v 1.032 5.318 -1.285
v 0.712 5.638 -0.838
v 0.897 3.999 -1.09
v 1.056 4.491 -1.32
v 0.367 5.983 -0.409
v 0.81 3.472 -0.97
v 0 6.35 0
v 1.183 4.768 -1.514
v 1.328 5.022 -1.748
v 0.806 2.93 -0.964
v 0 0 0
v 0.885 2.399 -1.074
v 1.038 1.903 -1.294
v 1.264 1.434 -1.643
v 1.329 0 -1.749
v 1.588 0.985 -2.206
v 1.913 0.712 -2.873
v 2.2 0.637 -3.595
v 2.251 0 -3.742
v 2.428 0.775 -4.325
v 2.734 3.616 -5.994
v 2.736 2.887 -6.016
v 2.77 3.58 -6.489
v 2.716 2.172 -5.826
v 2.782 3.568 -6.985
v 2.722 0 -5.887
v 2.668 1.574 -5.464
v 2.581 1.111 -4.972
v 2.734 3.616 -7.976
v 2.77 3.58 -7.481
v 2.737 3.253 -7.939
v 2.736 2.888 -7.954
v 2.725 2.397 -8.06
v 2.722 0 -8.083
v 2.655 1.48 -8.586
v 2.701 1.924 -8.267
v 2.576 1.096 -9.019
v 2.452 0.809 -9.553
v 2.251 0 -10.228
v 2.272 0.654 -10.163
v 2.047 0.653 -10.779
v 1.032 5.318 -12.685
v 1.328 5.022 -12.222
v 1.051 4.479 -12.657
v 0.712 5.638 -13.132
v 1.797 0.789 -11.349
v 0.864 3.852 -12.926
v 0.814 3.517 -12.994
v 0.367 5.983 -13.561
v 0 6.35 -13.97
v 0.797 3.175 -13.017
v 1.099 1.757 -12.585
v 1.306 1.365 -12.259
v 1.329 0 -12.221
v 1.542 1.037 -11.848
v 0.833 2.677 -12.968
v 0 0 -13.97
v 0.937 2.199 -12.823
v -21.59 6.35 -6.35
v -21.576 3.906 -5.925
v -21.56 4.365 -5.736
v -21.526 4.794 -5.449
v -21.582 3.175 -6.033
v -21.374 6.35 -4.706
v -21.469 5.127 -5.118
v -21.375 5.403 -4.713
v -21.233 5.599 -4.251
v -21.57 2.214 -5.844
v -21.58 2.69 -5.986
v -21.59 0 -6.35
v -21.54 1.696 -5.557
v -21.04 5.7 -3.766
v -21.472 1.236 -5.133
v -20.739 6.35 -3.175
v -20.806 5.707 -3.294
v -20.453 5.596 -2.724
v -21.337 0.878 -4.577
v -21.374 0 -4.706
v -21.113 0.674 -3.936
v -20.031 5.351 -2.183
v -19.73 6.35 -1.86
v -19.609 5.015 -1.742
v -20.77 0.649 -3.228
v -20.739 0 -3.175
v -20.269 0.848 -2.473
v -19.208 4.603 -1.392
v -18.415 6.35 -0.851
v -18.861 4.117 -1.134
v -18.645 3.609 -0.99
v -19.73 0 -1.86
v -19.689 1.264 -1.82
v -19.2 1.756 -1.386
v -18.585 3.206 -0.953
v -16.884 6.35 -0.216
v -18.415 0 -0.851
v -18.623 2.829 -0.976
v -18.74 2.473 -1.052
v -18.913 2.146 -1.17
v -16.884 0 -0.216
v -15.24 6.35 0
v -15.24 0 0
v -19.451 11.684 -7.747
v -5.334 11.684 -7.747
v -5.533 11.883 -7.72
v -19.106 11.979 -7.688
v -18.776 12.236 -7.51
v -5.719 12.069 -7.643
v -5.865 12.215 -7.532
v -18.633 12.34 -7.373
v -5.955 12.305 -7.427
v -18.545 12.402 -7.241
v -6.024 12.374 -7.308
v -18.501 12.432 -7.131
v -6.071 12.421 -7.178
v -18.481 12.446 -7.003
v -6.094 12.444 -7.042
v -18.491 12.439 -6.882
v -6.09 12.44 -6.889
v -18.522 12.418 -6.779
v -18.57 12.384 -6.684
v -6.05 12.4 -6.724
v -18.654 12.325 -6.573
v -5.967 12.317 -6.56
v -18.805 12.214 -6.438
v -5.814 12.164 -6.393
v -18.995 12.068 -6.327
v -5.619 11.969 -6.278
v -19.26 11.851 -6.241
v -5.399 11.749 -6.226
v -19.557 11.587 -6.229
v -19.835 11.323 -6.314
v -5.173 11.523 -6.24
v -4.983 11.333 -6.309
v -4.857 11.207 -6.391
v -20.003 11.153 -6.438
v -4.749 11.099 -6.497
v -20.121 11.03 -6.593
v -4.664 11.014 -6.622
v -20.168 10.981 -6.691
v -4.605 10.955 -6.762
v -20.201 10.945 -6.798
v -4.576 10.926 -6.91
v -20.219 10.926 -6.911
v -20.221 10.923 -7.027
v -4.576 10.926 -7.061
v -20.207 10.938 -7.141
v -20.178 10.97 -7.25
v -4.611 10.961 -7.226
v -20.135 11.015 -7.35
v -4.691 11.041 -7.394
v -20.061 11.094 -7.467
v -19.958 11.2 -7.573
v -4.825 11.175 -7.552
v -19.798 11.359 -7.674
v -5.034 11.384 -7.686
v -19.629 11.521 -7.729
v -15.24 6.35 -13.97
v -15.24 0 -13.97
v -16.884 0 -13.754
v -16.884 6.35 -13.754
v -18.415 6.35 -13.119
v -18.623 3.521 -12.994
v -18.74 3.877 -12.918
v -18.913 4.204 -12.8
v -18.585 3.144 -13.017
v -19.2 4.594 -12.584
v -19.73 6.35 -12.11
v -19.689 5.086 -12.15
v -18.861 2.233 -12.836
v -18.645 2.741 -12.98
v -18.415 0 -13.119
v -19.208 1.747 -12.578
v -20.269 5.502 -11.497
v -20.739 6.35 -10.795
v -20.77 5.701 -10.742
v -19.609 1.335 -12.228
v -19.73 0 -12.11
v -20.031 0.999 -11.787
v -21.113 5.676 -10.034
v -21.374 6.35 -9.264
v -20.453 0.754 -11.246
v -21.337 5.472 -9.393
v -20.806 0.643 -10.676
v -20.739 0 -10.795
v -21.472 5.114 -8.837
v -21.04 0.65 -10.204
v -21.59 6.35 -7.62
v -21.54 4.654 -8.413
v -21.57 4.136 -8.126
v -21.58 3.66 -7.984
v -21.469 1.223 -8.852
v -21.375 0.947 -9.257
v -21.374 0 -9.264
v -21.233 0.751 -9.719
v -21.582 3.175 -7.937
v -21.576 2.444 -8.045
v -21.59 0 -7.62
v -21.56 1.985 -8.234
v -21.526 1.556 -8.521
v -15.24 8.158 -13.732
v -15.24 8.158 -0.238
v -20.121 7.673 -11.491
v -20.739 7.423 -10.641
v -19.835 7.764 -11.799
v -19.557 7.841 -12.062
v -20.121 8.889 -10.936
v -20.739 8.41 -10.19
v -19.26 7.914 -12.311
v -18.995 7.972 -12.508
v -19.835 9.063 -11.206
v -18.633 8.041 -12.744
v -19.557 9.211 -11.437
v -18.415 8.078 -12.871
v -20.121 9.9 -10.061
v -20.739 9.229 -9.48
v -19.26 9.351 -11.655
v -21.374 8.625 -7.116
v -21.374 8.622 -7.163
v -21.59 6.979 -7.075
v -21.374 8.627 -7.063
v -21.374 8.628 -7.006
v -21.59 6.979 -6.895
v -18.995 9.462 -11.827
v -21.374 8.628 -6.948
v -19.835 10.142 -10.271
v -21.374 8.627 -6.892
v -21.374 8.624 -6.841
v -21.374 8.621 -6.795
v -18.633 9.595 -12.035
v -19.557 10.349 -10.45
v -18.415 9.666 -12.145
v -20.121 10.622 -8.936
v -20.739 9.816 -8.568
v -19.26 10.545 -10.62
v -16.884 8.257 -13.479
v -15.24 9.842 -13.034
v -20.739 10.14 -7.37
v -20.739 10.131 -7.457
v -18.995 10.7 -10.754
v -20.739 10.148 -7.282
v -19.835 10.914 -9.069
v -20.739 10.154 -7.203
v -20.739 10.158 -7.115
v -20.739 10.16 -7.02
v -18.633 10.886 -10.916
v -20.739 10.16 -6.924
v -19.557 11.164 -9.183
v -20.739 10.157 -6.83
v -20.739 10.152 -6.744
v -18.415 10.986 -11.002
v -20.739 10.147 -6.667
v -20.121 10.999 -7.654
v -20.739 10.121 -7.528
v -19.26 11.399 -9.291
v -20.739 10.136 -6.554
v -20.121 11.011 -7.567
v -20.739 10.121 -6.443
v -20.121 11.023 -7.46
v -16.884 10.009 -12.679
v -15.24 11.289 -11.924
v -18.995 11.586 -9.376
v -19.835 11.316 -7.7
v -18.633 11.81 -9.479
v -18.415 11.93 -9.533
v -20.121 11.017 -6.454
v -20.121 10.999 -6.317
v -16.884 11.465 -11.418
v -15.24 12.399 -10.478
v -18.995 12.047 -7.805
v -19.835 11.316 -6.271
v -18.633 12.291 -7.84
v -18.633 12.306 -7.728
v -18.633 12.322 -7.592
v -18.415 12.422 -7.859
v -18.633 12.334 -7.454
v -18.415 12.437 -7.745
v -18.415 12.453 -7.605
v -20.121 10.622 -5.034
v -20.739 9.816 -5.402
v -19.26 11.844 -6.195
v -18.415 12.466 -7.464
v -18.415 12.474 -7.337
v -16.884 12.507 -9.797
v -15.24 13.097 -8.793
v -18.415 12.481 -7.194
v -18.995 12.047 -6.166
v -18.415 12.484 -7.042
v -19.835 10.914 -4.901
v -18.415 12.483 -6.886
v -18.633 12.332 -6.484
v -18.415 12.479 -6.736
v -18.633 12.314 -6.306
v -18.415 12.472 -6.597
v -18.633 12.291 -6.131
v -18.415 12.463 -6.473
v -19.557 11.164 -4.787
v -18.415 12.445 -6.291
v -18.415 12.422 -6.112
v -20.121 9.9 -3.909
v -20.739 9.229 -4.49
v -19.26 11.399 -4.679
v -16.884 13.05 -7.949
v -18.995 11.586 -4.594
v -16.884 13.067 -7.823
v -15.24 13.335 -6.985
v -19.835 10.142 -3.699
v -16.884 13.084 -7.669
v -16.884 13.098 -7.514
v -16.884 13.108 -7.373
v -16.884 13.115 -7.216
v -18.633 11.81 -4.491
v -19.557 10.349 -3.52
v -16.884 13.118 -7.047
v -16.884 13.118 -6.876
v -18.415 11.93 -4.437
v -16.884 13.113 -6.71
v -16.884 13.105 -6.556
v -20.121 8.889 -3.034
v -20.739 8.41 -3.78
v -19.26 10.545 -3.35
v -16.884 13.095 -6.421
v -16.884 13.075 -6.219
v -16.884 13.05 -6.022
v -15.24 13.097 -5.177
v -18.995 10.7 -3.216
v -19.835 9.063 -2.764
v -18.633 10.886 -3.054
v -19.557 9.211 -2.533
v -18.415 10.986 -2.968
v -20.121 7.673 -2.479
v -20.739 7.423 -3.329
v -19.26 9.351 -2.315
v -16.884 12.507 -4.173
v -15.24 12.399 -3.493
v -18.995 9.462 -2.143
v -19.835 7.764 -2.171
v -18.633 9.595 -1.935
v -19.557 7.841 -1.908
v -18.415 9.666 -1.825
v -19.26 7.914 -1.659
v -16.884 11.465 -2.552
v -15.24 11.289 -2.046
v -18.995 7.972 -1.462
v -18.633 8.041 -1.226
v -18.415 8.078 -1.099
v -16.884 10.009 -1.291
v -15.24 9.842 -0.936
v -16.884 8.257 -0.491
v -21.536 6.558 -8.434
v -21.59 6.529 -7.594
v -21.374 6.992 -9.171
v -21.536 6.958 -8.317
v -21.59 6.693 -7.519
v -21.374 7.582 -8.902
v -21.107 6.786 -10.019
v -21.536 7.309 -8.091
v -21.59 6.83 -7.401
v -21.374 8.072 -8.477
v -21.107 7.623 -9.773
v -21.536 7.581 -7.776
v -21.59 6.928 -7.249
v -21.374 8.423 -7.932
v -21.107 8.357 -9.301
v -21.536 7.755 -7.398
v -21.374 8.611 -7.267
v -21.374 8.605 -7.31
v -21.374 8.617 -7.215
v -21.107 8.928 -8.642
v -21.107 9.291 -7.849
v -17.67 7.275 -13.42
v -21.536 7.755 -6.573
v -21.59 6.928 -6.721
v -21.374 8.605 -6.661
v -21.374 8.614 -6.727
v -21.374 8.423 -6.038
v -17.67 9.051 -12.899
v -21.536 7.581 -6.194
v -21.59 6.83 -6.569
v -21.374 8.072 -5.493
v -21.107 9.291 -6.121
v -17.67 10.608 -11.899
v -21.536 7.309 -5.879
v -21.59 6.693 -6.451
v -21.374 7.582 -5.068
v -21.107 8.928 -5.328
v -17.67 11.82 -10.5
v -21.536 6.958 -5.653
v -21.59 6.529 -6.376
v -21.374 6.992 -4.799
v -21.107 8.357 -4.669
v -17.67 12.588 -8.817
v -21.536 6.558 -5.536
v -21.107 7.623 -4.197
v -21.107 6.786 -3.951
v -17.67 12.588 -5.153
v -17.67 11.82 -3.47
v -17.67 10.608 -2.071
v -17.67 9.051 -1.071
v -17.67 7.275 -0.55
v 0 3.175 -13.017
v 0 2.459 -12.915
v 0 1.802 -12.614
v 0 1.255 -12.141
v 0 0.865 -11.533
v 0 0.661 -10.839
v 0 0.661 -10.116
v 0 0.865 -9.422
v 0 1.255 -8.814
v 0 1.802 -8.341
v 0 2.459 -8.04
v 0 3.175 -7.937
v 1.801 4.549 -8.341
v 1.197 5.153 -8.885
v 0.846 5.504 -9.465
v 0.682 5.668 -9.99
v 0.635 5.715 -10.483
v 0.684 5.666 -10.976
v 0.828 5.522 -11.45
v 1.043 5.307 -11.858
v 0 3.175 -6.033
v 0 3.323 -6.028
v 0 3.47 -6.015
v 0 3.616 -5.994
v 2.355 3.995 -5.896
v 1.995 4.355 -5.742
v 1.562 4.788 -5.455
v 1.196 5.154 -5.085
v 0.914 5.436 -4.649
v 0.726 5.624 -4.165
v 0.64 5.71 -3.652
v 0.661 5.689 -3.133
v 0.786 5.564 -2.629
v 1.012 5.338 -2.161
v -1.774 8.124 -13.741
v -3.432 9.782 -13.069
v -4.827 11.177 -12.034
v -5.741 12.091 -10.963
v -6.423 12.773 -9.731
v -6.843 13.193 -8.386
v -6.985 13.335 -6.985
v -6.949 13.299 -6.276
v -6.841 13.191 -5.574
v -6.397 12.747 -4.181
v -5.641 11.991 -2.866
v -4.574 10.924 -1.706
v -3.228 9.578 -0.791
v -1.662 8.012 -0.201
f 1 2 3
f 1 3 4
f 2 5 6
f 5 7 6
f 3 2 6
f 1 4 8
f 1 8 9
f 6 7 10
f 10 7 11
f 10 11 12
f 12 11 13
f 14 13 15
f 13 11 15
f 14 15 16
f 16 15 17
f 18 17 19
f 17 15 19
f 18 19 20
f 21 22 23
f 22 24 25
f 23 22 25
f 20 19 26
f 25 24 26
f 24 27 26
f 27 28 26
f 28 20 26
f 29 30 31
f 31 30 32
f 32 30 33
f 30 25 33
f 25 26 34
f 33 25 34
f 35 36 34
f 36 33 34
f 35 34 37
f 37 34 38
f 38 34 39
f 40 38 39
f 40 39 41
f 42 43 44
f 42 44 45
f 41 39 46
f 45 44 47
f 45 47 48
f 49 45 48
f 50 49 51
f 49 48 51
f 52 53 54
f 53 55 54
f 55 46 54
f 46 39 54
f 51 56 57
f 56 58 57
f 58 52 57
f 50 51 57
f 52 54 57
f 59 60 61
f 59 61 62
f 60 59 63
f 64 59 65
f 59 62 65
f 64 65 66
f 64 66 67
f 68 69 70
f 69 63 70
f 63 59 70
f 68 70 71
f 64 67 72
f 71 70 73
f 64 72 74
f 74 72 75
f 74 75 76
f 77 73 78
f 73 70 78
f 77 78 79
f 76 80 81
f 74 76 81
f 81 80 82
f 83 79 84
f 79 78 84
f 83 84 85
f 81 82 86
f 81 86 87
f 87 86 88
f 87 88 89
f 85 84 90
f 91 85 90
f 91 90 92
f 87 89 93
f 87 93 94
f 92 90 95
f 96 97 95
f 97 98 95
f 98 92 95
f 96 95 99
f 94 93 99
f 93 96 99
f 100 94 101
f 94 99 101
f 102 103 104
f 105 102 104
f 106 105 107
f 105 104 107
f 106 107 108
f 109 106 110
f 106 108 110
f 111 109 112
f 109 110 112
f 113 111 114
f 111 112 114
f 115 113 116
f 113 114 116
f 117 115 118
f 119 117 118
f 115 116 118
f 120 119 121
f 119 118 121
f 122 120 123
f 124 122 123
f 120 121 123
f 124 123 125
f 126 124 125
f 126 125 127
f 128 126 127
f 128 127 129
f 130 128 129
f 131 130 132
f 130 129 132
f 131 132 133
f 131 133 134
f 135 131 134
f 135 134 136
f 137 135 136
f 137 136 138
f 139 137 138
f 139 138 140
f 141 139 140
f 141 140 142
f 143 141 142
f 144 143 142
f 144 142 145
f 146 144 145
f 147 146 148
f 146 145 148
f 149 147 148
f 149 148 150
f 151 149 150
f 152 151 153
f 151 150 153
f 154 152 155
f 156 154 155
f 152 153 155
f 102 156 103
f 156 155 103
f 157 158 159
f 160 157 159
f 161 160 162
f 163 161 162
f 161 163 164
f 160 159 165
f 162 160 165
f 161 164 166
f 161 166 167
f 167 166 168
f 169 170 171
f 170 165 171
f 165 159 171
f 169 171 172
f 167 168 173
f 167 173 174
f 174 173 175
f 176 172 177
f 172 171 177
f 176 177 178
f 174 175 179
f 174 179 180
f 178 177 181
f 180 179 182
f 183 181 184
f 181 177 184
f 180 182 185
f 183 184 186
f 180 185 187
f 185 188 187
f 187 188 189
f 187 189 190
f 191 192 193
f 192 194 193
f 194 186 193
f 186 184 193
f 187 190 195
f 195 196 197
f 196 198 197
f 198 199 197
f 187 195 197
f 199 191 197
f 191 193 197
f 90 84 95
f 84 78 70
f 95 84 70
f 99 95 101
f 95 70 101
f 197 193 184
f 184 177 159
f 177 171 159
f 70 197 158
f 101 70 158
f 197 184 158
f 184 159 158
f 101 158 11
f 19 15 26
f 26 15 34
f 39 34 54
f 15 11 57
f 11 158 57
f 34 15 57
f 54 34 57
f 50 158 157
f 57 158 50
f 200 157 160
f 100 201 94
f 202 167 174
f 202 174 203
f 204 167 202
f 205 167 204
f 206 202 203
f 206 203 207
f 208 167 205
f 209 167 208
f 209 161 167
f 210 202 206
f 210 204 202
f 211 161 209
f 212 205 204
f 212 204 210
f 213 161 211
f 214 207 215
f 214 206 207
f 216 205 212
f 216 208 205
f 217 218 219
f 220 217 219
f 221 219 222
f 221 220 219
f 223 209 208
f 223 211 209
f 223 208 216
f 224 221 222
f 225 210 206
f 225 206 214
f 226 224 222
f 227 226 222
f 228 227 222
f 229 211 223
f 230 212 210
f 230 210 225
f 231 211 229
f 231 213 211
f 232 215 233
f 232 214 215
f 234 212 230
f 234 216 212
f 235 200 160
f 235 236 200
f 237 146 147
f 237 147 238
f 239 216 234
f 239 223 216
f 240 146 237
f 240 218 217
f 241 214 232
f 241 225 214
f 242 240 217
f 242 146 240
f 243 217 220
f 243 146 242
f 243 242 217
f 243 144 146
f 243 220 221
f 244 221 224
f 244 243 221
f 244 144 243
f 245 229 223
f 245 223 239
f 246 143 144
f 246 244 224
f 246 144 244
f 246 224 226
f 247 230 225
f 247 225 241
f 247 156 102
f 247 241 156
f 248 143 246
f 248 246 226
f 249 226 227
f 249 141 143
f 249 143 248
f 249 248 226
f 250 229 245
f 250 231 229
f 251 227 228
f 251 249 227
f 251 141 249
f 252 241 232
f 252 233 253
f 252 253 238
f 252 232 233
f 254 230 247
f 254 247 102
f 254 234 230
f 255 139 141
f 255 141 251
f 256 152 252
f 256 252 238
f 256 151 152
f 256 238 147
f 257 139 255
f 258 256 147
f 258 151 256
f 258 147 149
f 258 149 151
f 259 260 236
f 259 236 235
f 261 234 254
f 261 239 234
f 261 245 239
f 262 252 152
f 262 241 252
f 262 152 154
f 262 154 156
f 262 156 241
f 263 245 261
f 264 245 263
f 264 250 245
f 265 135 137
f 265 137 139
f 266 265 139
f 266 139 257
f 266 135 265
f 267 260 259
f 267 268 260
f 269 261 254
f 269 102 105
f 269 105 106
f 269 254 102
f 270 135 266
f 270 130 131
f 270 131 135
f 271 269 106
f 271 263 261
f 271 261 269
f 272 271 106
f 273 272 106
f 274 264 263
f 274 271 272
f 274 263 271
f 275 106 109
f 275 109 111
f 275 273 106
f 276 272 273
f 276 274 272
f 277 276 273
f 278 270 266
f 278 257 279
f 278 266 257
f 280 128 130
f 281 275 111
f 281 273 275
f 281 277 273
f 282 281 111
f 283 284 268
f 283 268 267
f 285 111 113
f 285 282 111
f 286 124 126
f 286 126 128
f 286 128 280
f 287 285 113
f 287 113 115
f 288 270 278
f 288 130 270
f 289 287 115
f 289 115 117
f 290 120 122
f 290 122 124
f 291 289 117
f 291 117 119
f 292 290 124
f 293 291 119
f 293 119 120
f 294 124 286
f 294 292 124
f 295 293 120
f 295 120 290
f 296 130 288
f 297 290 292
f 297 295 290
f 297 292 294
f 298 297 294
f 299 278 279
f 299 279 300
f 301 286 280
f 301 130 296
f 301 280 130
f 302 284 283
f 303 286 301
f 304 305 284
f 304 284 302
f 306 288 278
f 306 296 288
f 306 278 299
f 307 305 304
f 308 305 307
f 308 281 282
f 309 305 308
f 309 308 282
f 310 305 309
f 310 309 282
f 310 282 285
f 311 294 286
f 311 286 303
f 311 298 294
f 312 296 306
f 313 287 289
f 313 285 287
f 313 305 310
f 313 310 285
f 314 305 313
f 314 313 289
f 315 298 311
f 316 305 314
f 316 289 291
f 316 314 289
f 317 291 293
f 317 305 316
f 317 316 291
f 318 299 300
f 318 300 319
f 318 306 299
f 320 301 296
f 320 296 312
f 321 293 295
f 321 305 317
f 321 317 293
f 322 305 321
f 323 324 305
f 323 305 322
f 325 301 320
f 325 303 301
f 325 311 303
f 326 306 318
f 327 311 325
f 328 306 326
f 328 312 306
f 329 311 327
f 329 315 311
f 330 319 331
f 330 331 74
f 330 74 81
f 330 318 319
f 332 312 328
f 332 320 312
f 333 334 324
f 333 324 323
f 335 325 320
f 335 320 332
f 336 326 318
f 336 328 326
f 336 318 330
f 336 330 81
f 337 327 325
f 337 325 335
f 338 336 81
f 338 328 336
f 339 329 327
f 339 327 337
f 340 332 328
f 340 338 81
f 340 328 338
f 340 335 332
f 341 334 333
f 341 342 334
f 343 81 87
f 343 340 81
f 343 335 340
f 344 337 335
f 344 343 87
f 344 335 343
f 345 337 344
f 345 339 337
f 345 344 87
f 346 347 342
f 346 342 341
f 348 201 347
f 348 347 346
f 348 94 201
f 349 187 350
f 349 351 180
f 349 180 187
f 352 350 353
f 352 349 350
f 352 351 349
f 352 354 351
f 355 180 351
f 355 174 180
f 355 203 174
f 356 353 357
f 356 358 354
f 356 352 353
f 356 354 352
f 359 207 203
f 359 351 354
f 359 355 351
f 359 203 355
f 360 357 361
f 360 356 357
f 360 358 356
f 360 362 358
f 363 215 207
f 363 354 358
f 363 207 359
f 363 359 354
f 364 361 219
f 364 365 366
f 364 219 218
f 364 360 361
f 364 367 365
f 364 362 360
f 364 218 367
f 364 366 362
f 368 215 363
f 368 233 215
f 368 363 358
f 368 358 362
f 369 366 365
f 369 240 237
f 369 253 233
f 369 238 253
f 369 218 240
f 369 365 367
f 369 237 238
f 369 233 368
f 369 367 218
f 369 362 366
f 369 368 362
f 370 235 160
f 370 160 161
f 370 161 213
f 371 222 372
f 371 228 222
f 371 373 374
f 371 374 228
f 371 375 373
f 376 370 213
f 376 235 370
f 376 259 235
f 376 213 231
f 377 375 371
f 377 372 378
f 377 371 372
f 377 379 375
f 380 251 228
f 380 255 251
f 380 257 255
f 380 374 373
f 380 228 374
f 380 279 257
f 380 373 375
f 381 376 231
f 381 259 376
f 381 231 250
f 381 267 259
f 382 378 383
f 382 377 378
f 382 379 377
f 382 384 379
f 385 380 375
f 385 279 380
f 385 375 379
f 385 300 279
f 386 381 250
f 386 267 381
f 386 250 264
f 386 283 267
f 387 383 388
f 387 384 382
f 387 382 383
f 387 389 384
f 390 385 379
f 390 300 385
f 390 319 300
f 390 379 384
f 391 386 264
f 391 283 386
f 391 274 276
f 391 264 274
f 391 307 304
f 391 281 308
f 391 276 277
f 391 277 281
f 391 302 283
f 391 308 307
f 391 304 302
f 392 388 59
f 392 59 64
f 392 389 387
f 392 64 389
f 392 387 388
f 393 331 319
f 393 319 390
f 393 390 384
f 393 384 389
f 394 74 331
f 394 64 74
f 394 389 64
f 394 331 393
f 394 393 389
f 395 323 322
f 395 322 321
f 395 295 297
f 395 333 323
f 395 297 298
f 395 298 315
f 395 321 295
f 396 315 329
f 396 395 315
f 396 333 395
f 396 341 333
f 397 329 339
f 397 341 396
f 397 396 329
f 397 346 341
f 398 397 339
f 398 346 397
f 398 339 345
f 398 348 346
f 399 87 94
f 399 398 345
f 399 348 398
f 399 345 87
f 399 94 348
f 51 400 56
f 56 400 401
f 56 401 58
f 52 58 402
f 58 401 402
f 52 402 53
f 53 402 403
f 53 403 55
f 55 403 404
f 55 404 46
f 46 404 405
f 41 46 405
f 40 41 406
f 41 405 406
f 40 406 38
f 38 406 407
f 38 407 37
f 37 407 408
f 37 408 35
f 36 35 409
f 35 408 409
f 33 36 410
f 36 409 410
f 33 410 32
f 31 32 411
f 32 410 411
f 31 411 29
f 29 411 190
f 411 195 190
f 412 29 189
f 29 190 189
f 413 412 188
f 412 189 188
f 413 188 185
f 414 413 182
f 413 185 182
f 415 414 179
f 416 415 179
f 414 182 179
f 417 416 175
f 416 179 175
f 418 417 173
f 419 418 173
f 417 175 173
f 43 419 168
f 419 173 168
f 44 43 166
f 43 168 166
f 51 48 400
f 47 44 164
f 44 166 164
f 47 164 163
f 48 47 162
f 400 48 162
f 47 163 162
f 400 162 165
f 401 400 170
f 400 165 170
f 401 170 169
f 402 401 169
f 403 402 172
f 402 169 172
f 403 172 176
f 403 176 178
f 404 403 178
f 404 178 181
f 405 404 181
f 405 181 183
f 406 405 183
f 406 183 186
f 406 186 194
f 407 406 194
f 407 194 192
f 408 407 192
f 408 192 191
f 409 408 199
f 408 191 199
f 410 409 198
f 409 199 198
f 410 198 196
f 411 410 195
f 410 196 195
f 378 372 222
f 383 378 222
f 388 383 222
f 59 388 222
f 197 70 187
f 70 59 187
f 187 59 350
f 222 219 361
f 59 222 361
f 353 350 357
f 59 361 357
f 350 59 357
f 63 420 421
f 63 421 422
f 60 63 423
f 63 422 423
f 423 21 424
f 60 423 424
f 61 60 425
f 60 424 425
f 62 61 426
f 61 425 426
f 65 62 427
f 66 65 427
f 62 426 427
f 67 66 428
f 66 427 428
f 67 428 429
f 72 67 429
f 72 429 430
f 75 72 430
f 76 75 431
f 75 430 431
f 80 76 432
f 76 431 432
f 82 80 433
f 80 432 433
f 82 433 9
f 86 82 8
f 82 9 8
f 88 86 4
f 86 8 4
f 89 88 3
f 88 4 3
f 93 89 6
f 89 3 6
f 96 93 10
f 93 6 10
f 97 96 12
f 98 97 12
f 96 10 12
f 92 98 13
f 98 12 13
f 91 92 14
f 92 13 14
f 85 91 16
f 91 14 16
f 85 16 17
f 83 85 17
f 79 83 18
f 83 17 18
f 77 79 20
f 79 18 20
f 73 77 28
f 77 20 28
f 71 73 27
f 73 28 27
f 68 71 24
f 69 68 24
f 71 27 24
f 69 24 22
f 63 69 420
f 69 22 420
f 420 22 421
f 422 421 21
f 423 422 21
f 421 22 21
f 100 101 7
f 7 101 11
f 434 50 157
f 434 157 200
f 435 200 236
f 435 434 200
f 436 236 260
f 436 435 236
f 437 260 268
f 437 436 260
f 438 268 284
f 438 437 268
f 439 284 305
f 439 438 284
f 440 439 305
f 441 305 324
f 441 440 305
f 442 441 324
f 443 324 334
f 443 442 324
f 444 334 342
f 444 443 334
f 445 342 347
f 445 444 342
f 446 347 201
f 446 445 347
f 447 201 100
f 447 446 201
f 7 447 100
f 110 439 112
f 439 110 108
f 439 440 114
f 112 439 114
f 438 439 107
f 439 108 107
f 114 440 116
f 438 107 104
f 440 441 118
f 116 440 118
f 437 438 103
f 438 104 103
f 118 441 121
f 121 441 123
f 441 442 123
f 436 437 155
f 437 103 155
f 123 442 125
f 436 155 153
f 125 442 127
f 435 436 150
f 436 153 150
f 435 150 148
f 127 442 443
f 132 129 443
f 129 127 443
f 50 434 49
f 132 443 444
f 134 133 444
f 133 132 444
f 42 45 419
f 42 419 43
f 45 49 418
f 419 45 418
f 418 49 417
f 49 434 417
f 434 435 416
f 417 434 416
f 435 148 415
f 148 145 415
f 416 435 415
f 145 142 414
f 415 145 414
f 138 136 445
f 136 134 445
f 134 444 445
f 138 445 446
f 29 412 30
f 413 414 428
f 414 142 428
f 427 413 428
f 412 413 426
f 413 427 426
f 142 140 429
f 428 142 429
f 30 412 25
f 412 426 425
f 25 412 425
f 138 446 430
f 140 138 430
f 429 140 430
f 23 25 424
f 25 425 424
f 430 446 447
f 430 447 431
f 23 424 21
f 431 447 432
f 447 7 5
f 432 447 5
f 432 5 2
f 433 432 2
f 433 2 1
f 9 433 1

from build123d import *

# Parameters (mm, degrees)
SKETCH1_W                = 21.59
SKETCH1_H                = 13.97
DEPTH_A_DEPTH            = 6.35
ROUND_EXTRUDE_DEPTH      = 21.59
ANGLE_CUT_DEPTH          = 29.967416609
STRING_HOLE_R            = 0.762
STRING_HOLE_CUT_DEPTH    = 29.967416609
ELASTIC_HOLES_R          = 2.54
ELASTIC_HOLE_CUT_DEPTH   = 29.967416609
FILLET1_R                = 6.35
GUIDE_OUTIE_REACH        = 30.967
SKETCH7_R                = 2.54
ELASTIC_HOLE_CUT_2_DEPTH = 29.967416778


with BuildPart() as part:
    # Sketch1 → depth a (new body)
    with BuildSketch(Plane(origin=(0, 0, 0), x_dir=(1, 0, 0), z_dir=(0, 1, 0))):
        with Locations((-10.795, 6.985)):
            Rectangle(SKETCH1_W, SKETCH1_H)
    extrude(amount=DEPTH_A_DEPTH)

    # Sketch4 → round extrude (add)
    with BuildSketch(Plane(origin=(0, 0, 0), x_dir=(0, 0, -1), z_dir=(1, 0, 0))):
        with BuildLine():
            Line((0, 6.35), (13.97, 6.35))
            ThreePointArc((13.97, 6.35), (6.985, 13.335), (0, 6.35))
        make_face()
    extrude(amount=-ROUND_EXTRUDE_DEPTH)

    # Sketch5 → angle cut (cut, through all)
    with BuildSketch(Plane.XY):
        Polygon((0, 6.35), (0, 13.335), (-6.985, 13.335), align=None)
    extrude(amount=-ANGLE_CUT_DEPTH, mode=Mode.SUBTRACT)

    # string hole → string hole cut (cut, through all)
    with BuildSketch(Plane(origin=(0, 0, 0), x_dir=(0, 0, -1), z_dir=(1, 0, 0))):
        with Locations((6.985, 11.684)):
            Circle(STRING_HOLE_R)
    extrude(amount=-STRING_HOLE_CUT_DEPTH, mode=Mode.SUBTRACT)

    # elastic holes → elastic hole cut (cut, through all)
    with BuildSketch(Plane(origin=(0, 0, 0), x_dir=(0, 0, -1), z_dir=(1, 0, 0))):
        with Locations((3.4925, 3.175)):
            Circle(ELASTIC_HOLES_R)
        with Locations(Location((10.4775, 3.175, 0), (0, 0, 180))):
            Circle(ELASTIC_HOLES_R)
    extrude(amount=-ELASTIC_HOLE_CUT_DEPTH, mode=Mode.SUBTRACT)

    # Fillet1
    # the kernel refuses this fillet: 6.35 mm, written as the material it takes off along each edge
    with BuildSketch(Plane(origin=(-21.59, 6.35, -6.985), x_dir=(0, 0, -1), z_dir=(0, -1, 0))) as fillet1_piece_1:
        with BuildLine():
            CenterArc((6.985 - FILLET1_R, FILLET1_R), FILLET1_R, 270, 90)
            Line((6.985, FILLET1_R), (6.985, 0))
            Line((6.985, 0), (6.985 - FILLET1_R, 0))
        make_face()
    revolve(axis=Axis((-21.59, 6.35, -6.985), (1, 0, 0)), revolution_arc=180, mode=Mode.SUBTRACT)
    with BuildSketch(Plane(origin=(-21.59, -15.875, 0), x_dir=(1, 0, 0), z_dir=(0, 1, 0)), Plane(origin=(-21.59, -15.875, -13.97), x_dir=(0, 0, 1), z_dir=(0, 1, 0))) as fillet1_piece_2:
        with BuildLine():
            CenterArc((FILLET1_R, FILLET1_R), FILLET1_R, 180, 90)
            Line((0, FILLET1_R), (0, 0))
            Line((0, 0), (FILLET1_R, 0))
        make_face()
    extrude(amount=22.225, mode=Mode.SUBTRACT)

    # guide outie: up to this plane
    guide_outie_end = Plane(origin=(-6.985, 13.335, -13.97), z_dir=(-0.7071067811865512, -0.7071067811865439, 0))
    # guide → guide outie (add, up to the surface)
    with BuildSketch(Plane(origin=(0, 0, 0), x_dir=(1, 0, 0), z_dir=(0, 1, 0)), mode=Mode.PRIVATE) as guide_outie_sk1:
        with BuildLine():
            Line((0, 13.97), (0, 0))
            ThreePointArc((0, 0), (2.781966725, 6.985), (0, 13.97))
        make_face()
    guide_outie_tool1 = split(extrude(guide_outie_sk1.sketch, amount=GUIDE_OUTIE_REACH, mode=Mode.PRIVATE), bisect_by=guide_outie_end, keep=Keep.BOTH, mode=Mode.PRIVATE)
    add(guide_outie_tool1.solids().sort_by_distance((1.126975, 0, -6.985))[0])

    # Sketch7 → elastic hole cut 2 (cut, through all)
    with BuildSketch(Plane.ZY):
        with Locations(Location((-3.4925, 3.175, 0), (0, 0, 169.990167885))):
            Circle(SKETCH7_R)
        with Locations(Location((-10.4775, 3.175, 0), (0, 0, 180))):
            Circle(SKETCH7_R)
    extrude(amount=-ELASTIC_HOLE_CUT_2_DEPTH, mode=Mode.SUBTRACT)


solid = part.part
